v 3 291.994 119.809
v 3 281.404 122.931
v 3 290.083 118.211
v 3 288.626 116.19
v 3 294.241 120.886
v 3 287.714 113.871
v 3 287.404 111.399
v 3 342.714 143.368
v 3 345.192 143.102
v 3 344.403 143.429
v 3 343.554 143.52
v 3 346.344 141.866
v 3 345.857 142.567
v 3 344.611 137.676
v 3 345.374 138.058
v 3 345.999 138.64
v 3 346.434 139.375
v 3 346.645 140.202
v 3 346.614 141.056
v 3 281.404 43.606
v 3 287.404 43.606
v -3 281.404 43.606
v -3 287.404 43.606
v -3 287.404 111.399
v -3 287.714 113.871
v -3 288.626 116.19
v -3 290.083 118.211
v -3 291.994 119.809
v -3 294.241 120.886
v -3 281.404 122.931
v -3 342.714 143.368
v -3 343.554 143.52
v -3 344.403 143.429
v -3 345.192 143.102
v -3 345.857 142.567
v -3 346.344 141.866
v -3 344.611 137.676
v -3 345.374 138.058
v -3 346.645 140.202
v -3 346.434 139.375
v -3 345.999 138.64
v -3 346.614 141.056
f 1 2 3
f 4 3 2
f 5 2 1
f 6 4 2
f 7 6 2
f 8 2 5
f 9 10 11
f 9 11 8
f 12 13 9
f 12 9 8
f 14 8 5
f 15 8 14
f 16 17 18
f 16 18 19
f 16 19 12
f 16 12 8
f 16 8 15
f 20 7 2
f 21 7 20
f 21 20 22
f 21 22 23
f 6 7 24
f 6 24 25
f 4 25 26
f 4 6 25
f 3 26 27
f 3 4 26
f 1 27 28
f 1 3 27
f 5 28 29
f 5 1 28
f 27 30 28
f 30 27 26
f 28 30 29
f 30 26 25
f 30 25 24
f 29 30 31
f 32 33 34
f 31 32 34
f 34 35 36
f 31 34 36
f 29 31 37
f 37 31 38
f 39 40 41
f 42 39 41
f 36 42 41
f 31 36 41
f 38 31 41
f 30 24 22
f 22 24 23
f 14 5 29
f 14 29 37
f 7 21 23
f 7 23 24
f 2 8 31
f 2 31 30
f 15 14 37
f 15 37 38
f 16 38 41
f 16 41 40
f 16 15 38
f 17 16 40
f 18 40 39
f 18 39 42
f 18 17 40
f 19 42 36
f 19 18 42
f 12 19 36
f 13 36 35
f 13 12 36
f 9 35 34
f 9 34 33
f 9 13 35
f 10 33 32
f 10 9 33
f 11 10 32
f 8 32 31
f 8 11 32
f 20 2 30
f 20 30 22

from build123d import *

# Parameters (mm, degrees)
SALIENTE_EXTRUIR1_DEPTH = 6


with BuildPart() as part:
    # Croquis1 → Saliente-Extruir1 (new body)
    with BuildSketch(Plane(origin=(3, 0, 0), x_dir=(0, 0, -1), z_dir=(1, 0, 0))):
        with BuildLine():
            Line((-143.367600492, 342.71356838), (-122.930987198, 281.403728499))
            Line((-122.930987198, 281.403728499), (-43.606431878, 281.403728499))
            Line((-43.606431878, 281.403728499), (-43.606431878, 287.403728499))
            Line((-43.606431878, 287.403728499), (-111.398839678, 287.403728499))
            ThreePointArc((-111.398839678, 287.403728499), (-117.245942524, 289.291306647), (-120.885672658, 294.241450839))
            Line((-120.885672658, 294.241450839), (-137.675500704, 344.610934976))
            ThreePointArc((-137.675500704, 344.610934976), (-141.470233896, 346.508301573), (-143.367600492, 342.71356838))
        make_face()
    extrude(amount=-SALIENTE_EXTRUIR1_DEPTH)


solid = part.part
